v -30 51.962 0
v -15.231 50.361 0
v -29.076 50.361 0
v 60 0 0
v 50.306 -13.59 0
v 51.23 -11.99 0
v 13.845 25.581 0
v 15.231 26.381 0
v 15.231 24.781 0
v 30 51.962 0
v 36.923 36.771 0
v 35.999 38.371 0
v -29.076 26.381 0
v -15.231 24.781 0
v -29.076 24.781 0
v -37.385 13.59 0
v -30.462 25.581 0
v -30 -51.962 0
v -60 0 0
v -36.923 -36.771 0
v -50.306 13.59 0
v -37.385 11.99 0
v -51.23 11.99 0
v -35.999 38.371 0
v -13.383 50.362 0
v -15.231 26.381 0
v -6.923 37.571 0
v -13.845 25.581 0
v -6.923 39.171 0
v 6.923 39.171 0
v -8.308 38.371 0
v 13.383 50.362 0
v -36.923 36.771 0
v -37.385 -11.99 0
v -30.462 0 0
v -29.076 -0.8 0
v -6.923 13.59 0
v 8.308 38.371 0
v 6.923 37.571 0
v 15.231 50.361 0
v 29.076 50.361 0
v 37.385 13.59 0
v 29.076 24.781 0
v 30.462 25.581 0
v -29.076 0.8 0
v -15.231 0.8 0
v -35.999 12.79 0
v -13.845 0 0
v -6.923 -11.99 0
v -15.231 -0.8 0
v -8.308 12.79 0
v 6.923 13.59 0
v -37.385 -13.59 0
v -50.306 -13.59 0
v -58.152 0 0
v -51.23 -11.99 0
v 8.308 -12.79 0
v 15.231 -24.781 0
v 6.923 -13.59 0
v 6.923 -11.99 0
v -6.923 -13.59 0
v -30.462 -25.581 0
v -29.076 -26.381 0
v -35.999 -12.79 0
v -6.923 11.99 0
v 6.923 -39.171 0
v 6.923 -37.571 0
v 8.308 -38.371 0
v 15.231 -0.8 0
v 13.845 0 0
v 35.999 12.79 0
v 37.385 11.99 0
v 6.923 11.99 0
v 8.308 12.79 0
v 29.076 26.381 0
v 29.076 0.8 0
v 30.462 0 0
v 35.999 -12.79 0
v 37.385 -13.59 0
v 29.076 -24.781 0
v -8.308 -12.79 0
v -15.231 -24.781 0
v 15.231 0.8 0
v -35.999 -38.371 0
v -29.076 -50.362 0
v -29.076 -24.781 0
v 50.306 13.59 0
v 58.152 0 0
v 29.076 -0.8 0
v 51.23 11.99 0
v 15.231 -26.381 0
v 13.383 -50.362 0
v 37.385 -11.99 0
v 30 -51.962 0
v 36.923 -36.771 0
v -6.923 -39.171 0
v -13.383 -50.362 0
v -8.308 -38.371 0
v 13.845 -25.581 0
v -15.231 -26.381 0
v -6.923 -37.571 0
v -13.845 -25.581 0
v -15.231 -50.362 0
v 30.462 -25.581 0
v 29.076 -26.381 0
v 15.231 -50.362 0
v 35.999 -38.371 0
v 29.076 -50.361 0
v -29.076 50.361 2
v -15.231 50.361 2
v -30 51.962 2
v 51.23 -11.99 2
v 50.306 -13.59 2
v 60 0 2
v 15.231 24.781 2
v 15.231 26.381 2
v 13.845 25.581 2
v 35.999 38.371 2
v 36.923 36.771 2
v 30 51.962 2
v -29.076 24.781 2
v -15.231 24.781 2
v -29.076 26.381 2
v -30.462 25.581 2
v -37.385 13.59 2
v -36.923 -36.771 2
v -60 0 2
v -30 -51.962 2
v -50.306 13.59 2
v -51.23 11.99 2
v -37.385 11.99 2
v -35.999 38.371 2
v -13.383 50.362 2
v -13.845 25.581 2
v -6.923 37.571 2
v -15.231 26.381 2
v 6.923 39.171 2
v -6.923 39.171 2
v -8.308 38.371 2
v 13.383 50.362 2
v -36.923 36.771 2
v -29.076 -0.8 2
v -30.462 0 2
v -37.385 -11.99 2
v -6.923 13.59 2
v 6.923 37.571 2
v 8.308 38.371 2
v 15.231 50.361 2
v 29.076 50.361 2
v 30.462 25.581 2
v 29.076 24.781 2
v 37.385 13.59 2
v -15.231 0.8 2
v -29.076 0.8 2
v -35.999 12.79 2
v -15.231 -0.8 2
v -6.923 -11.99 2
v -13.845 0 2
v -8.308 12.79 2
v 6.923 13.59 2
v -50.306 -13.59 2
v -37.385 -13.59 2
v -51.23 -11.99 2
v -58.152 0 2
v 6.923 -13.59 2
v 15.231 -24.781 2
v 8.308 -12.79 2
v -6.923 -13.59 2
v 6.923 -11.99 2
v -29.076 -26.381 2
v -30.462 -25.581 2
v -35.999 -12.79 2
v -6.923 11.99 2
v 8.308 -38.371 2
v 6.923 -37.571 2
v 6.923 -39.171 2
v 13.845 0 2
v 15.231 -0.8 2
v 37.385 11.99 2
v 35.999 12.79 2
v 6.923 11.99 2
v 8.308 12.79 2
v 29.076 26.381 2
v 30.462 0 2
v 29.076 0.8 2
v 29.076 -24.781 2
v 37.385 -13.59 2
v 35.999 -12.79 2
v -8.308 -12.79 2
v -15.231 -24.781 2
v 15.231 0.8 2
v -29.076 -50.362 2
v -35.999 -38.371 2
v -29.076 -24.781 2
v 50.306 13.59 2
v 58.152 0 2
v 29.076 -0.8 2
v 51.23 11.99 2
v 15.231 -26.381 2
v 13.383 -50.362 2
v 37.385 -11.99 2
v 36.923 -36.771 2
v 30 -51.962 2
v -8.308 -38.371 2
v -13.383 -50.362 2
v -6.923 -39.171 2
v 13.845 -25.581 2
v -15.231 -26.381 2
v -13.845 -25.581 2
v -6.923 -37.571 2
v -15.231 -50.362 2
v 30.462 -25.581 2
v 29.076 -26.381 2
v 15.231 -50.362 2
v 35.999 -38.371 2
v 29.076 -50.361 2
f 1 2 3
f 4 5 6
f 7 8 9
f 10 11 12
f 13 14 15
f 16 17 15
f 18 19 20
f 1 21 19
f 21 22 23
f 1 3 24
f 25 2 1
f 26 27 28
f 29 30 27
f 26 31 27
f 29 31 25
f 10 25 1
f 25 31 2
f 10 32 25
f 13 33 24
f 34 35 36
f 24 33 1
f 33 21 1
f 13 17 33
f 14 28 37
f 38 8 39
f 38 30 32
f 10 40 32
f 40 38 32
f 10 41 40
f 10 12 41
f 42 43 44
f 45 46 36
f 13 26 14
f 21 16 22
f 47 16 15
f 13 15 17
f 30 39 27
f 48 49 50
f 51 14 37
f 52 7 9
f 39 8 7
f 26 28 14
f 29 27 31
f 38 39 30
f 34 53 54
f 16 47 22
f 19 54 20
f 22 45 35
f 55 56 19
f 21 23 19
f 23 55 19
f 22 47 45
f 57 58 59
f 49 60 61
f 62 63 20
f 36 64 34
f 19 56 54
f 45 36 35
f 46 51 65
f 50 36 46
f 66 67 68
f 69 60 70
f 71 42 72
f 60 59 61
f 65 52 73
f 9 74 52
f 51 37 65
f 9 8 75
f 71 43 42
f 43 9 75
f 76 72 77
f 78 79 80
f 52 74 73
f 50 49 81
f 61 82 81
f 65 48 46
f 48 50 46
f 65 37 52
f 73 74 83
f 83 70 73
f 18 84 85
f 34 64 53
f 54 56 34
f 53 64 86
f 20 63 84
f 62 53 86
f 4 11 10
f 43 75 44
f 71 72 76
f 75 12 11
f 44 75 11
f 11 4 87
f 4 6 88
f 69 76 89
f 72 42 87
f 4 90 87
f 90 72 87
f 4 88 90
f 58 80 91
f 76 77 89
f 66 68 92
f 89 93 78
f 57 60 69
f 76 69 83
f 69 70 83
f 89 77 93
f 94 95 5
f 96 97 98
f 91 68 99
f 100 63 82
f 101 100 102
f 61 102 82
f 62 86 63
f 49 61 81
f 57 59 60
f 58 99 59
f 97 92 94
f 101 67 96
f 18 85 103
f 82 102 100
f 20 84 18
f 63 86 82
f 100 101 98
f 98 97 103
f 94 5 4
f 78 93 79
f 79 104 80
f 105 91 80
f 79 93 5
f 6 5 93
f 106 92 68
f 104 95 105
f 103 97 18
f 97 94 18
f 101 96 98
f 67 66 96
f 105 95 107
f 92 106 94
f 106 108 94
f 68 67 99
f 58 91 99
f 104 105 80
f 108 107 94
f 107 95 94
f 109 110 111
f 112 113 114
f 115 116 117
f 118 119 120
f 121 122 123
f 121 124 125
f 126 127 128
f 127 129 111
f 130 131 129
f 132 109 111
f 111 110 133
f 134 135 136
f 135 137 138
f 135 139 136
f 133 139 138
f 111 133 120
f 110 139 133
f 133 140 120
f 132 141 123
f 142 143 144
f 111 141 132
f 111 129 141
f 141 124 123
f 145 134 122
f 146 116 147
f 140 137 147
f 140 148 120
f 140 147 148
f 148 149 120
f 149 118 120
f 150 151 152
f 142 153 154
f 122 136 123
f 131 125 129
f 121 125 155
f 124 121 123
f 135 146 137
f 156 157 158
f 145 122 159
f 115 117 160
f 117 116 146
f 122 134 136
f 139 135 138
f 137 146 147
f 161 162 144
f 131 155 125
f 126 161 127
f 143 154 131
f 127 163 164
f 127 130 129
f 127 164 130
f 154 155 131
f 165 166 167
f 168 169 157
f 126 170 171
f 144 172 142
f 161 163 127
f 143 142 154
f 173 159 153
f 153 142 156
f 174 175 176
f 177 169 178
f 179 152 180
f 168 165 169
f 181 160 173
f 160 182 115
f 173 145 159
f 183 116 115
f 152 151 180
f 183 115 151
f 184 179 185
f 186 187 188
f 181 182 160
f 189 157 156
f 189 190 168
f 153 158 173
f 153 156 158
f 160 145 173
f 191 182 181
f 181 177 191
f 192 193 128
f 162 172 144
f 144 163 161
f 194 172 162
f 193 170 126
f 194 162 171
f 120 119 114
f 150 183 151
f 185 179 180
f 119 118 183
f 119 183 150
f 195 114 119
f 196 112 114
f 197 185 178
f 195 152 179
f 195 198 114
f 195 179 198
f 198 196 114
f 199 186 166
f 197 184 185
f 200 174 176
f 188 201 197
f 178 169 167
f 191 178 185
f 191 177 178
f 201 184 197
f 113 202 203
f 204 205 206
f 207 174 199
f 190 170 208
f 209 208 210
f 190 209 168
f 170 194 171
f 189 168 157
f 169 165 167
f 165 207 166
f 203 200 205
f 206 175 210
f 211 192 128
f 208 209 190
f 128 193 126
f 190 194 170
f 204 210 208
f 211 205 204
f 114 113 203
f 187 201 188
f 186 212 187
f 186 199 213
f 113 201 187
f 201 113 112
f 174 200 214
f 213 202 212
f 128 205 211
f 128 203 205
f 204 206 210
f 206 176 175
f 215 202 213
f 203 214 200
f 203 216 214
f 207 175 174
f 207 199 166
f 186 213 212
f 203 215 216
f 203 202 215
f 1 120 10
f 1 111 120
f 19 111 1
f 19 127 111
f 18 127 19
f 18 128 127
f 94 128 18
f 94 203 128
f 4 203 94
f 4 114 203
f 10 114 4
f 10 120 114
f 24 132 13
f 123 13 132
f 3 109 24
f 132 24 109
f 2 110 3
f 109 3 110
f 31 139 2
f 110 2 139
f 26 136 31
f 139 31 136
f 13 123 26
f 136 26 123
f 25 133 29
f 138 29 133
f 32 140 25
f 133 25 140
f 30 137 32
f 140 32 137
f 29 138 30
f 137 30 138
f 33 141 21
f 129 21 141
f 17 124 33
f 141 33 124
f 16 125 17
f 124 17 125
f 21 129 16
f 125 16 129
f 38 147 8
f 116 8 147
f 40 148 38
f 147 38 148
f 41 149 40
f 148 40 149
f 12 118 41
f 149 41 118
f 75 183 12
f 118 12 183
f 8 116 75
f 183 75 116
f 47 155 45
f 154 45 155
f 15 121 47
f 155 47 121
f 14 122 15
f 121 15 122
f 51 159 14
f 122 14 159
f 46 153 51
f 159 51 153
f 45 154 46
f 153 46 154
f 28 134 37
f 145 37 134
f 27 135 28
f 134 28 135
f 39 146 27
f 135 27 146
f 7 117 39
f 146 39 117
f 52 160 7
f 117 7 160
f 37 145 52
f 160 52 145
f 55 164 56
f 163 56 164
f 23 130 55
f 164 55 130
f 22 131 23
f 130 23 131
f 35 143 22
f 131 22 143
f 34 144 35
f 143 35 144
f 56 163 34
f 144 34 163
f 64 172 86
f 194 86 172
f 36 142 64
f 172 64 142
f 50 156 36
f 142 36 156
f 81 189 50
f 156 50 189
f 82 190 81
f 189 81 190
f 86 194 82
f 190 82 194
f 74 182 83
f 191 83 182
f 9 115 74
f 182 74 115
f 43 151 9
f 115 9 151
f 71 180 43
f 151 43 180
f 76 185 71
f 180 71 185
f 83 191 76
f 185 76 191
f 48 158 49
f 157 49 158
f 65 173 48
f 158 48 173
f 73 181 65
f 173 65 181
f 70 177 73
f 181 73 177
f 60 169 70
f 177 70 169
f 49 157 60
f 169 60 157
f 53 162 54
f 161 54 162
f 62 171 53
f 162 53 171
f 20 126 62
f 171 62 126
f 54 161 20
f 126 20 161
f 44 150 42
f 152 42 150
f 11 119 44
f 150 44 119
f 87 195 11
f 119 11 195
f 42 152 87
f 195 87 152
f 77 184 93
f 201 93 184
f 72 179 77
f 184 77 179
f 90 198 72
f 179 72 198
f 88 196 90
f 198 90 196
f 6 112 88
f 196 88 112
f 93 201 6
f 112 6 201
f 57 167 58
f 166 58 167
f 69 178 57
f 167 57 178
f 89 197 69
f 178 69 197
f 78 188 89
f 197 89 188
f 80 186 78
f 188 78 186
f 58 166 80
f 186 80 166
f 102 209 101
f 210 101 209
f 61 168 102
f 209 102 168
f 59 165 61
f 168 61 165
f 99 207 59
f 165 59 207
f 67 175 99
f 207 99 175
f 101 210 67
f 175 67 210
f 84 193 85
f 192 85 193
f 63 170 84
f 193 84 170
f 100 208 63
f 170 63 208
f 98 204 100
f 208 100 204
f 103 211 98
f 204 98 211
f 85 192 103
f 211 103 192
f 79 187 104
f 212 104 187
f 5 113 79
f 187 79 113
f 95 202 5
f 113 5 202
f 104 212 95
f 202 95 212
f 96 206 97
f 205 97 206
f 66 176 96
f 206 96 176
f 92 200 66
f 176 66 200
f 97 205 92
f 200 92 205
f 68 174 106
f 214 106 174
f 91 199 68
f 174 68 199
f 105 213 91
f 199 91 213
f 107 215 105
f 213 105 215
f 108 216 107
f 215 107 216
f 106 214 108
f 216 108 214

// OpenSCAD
/* 
teselación hexagonal
gridHex1
100hex https://tecnoloxia.org/100hex/
CC By-SA
*/

/* visualización
------------------------
*/

hexagono(forma);
// tesela(forma);
// grid(forma);         // (F6)


/* Parámetros:
------------------------
*/

w = 1.6;              // separación (ancho liñas)
h = 2 ;                // altura
hex = 60 ;             // lado do hexágono
bordo = w ;           // ancho do bordo do hexágono

n = 4 ;                // teselas (formas 5, 6, 8, 9, 11, 12, 13 --> n par)

forma = 0 ;
//  0:hexágonos, 1:cubos, 2:triángulos, 3:cadrados random, 4:triángulos random,
//5:asahona, 6:soles, 7:pétalos, 8:FlowerOfLife1, 9:FlowerOfLife2, 
//10:círculos superpostos, 11:flores, 12: malla, 13: pajarita nazarí, 14: trapecios,
//15: estrelas-cubos, 16: Francois stone mosaic, 17: entrelazado, 18:FlowerOfLife3,
//19:flores2, 20:rectángulos superpostos, 21: círculos1, 22: círculos2, 
//23: círculos3, 24: estrelas e hexágonos 1, 25: estrelas e hexágonos 2, 
//26: estrelas e hexágonos 3, 27: estrelas e hexágonos 4, 
//28: círculos e triángulos, 29: estrelas e cadrados, 30: cubos2, 
//31: ondas1, 32: ondas2, 33: aspas

res = 60;       // resolución dos círculos

echo ("forma=", forma);
echo ("n=", n);

/* 
------------------------ 
*/

//  para centrar as seguintes formas n debe ser par
f= (forma==5||forma==6||forma==8||forma==9||forma==11||forma==12||forma==13||forma==14||forma==15||forma==16||forma==17||forma==18||forma==19||forma==20||forma==21||forma==22||forma==23 ||forma==24||forma==25||forma==26||forma==27||forma==29||forma==30   ) ? 1 : 0;
nt= f==1 && n%2==1 ? n+1 : n;       

// diámetro tesela (altura hexágono)
d =                             
n==0 ? 0: 
f==1 ? (2*hex-w/cos(30))/nt :
(2*hex*cos(30)-w)/nt; 

echo ("distancia d=", d);

// outras dimensións

d1=d/cos(30);
r=d/2;
r1=r/cos(30);
r2=(r+w/2)/cos(30);
r3=(r-w/2)/cos(30);

// xeración da tesela

module tesela(forma){
    
    // hexágonos
    
    if (forma==0) {
        difference(){
            circle (r=r3, $fn=6);
        }
    }
    
    // cubos
    
    if (forma==1) {
        difference() {
            circle (r=r3, $fn=6);
            for(i=[0:120:360]) rotate(i+30) translate([0,r,0]) square([w,d], center=true);
        }
    }
    
    // triángulos
    
    if (forma==2) {
        difference() {
            circle (r=r3, $fn=6);
            for(i=[0:60:360]) rotate(i+30) translate([0,r,0]) square([w,d], center=true);
        }
    }
    
     // cadrados random
    
    if (forma==3){
        xiro=(round(rands(-0,12,1)[0]));
        echo (xiro*15);
        rotate(xiro*15) circle (r=r-w/2, $fn=3);
    } 

     // triángulos random
    
    if (forma==4){
        xiro=(round(rands(-0,12,1)[0]));
        echo (xiro*15);
        rotate(xiro*15) circle (r=r-w/2, $fn=4);
    } 
    
    // asahona    
    
    if (forma==5){  
        difference(){
            circle (r=r1+0.01, $fn=6);
            for(i=[0:30:360]) rotate(i+30) square([w,d1], center=true);
        }
    }
    
    // soles   
    
    if (forma==6){
        difference(){
            circle (r=r1+0.01, $fn=6);
            rotate(120) 
                for(i=[0:15:360]) rotate(i+30) translate([0,r,0]) square([w,2*(d+w)], center=true);
        }
    } 
    
    // pétalos
    
    if (forma==7){
            rotate(15) for(i=[0:60:360]) rotate(i+32) intersection() {
                translate([-d/7,d/3,0]) circle (r=d/4,  $fn=res);
                translate([d/7,d/3,0]) circle (r=d/4, $fn=res);
            }
    }
    
   // flower of life 1
    
    if (forma==8){
        difference(){
            circle (r=r2, $fn=6);
                for ( i = [0 : 60 : 360] ){
                translate([d*sin(i),d*cos(i),0]) difference() {
                    circle(r=d+w/2, $fn=res);
                    circle(r=d-w/2, $fn=res);
                }    
            }
        }
    }
    
   // flower of life 2
    
    if (forma==9){
        difference(){
            circle (r=r2, $fn=6);
            for(i=[0:60:360]){
                rotate(i) intersection() {
                    translate([d*sin(0),d*cos(0),0]) circle(r=d+w/6, $fn=res); 
                    translate([d*sin(60),d*cos(60),0]) circle(r=d+w/6, $fn=res);
                    translate([d*sin(120),d*cos(120),0]) circle(r=d+w/6, $fn=res);
                }
            }
        } 
    }
    
   //círculos superpostos
    
   if (forma==10){
        difference(){
            circle (r=(r1)/cos(30), $fn=6);
            intersection() {
                circle (r=(r1)/cos(30)+0.01, $fn=6);
                for(i=[0:60:360]){
                    rotate(i) translate([0,d,0]) circle(r=r2-0.3, $fn=res); 
                }
            } 
        }
    }
    
   //flores
    
    if (forma==11){
        rotate(30) for(i=[0:60:360]){
            rotate(i) intersection() {
                translate([r2*sin(0),r2*cos(0),0]) circle(r=r1, $fn=res); 
                translate([r2*sin(60),r2*cos(60),0]) circle(r=r1, $fn=res);
                translate([r2*sin(120),r2*cos(120),0]) circle(r=r1, $fn=res);
            }
        }
    }
    
    // malla   
    
    if (forma==12){  
        difference(){
            circle (r=r3, $fn=6);
            for(i=[0:30:360]) rotate(i+30) square([w,d1], center=true);
        }
    }
   
    // pajarita nazari da Alhambra
    
    if (forma==13){
        rotate(30-atan(w/r3))  difference() {
            union() {
                circle(r3/2, $fn=res);
                for (i=[0:2]) rotate(i*120) translate([0,r3/2]) circle(r3/2, $fn=res);
            }
            for (i=[0:2]) rotate(i*120) translate([(d-w)/2,0]) circle(r3/2, $fn=res);
        }
    }
    
    // trapecios
    
    if (forma==14){
        difference() {
            circle (r=r3, $fn=6);
            // for(i=[0:90:360]) rotate(i+30) translate([0,r,0]) square([w,d], center=true);
            for(i=[0:60:360]) rotate(i) translate([0,d1/4*cos(30),0]) square([r1*(1-sin(30))+w/2,w], center=true);
            for(i=[0:60:360]) rotate(i+30) translate([0,r1,0]) square([w,d1*(1-sin(30))+w/2], center=true);
            for(i=[0:60:360]) rotate(i+60) translate([0,r,0]) square([w,r-w], center=true);
        }
    }
    
     // estrelas e cubos
    
    if (forma==15){
        difference() {
            circle (r=r3, $fn=6);
            //for(i=[0:60:360]) rotate(i+30) translate([0,r,0]) square([w,d], center=true);
            for(j=[0:60:360]) rotate(j) 
                translate([d1/4*cos(60),d1/4*sin(60),0]) for(i=[0:120:120]) rotate(i-90) translate([0,r,0]) square([w,d+w/2], center=true);
        }
    }   
    
    // Francois stone mosaic   

    if (forma==16){
        difference() {
            rotate(30) circle (r=r1/cos(30)-w/2/cos(30), $fn=6);
            for(i=[0:120:360]) rotate(i) translate([0,r,0]) square([w,d], center=true);
            for(i=[0:120:360]) rotate(i+60) translate([0,3/2*r1/cos(30)-w/cos(30),0]) rotate(30) circle(r=r1/cos(30)-w/2/cos(30), $fn=6);
         }
    }
    
    // Entrelazado

    if (forma==17){
        difference() {
            rotate(30) circle (r=r1/cos(30), $fn=6);
            for(i=[0:120:360]) rotate(i) translate([0,r,0]) square([w,d], center=true);
            for(i=[0:120:360]) rotate(i+60) translate([0,3/2*r1/cos(30)-3/2*w/cos(30),0]) rotate(30) circle(r=r1/cos(30)-w/2/cos(30), $fn=6);
         }
    }
    
    // flower of life 3
    
    if (forma==18) {
            for(i=[0:60:360]){
                rotate(i) intersection() {
                    translate([d*sin(0),d*cos(0),0]) circle(r=d-w/2, $fn=res); 
                    translate([d*sin(60),d*cos(60),0]) circle(r=d-w/2, $fn=res);
                    translate([d*sin(120),d*cos(120),0]) circle(r=d-w/2, $fn=res);
                }
            }
    }

   //flores2
    
    if (forma==19){
        difference(){
            circle (r=r1+0.01, $fn=6);
            rotate(30) for(i=[0:60:360]){
                rotate(i) intersection() {
                    translate([r1*sin(0),r1*cos(0),0]) circle(r=r2, $fn=res); 
                    translate([r1*sin(60),r1*cos(60),0]) circle(r=r2, $fn=res);
                    translate([r1*sin(120),r1*cos(120),0]) circle(r=r2, $fn=res);
                }
            }
        }
    }

     // rectángulos superpostos
    
    if (forma==20){
        difference() {
            circle (r=r1+0.01, $fn=6);
            for(i=[0:60:360]) rotate(i) translate([0,r,0]) difference() { 
                square([r1+w,r1*cos(30)+w], center=true);
                square([r1-w,r1*cos(30)-w], center=true);
            }
        }       
    }
    
    // círculos1
    
    if (forma==21){      
        difference() {
            circle (r=r1+0.01, $fn=6);
            for(i=[0:60:360]) rotate(i+30) translate([0,r1,0]) 
                circle(r=r1/2+0.2, $fn=res);
        }       
    }
    
    // círculos2
    
    if (forma==22){     
        difference() {
            circle (r=r1+0.01, $fn=6);
            for(i=[0:60:360]) rotate(i+30) translate([0,r1,0]) 
                difference() { 
                    circle(r=r1/2+w/2, $fn=res);
                    circle(r=r1/2-w/2, $fn=res);                
                }
        }       
    }
    
    // círculos3
    
    if (forma==23){     
        for(i=[0:60:360]) rotate(i+30) translate([0,r1,0]) 
            circle(r=r1/2-w/2, $fn=res);    
    }
    
   //estrelas e hexágonos 1
    
   if (forma==24){      
        difference() {
            circle (r=r1+0.01, $fn=6);
            for(i=[0:60:360]) rotate(i+30) 
                translate([2*r1-r1*cos(30)/2,0,0]) 
                difference() { 
                    circle(r=r1+w/2/cos(30),  $fn=6);
                    circle(r=r1-w/2/cos(30), $fn=6);                
                }
        }  
    }
    
    //estrelas e hexágonos 2
    
    if (forma==25){    
        difference() {
            circle (r=r1+0.01, $fn=6);
            for(i=[0:60:360]) rotate(i+30) 
                translate([2*r1-r1*cos(30)/2,0,0]) 
                    circle(r=r1+w/2/cos(30),  $fn=6);          
        }  
    } 
        
    // estrelas e hexágonos 3
    
   if (forma==26){       
        difference() {
            circle (r=r1+0.01, $fn=6);
            for(i=[0:60:360]) rotate(i+0) 
                translate([r1*(2-cos(60)),0,0]) 
                difference() { 
                    circle(r=r1+w/2/cos(30), $fn=6);
                    circle(r=r1-w/2/cos(30), $fn=6);                
                }
        }  
   }
 
     // estrelas e hexágonos 4   
    
    if (forma==27){    
        difference() {
            circle (r=r1+0.01, $fn=6);
            for(i=[0:60:360]) rotate(i+0) 
                translate([r1*(2-cos(60)),0,0]) 
                    circle(r=r1+w/2/cos(30), $fn=6);            
        }  
    }
    
    // círculos e triángulos
    
    if (forma==28) {
        difference() {
            circle (r=r3, $fn=6);
            for(i=[0:60:360]) rotate(i+30) translate([0,r,0]) square([w,d], center=true);
            for(i=[0:60:360]) rotate(i) translate([0,(r3+w/2)/2/cos(30),0]) 
                difference(){
                    circle (r=r3/2*tan(30)+w/2, $fn=res);
                    circle (r=r3/2*tan(30)-w/2, $fn=res);
                }
        }
    }
    
    // estrelas e cadrados
    
    if (forma==29){  
      rc=((r1-w*(1+tan(30)))*cos(45)/cos(15))/2;
      for(i=[0:60:360]) rotate(i) 
      translate([r1-rc-w/2/cos(30),0,0]) circle(r=rc, $fn=4);  
    }    
    
    // cubos2  

    if (forma==30){
        difference() {
            rotate(30) circle (r=r1/cos(30)-w/2/cos(30), $fn=6);
            for(i=[0:120:360]) rotate(i) translate([0,r,0]) square([w,d], center=true);
            for(i=[0:120:360]) rotate(i) translate([0,r1/cos(30)/2,0]) for(i=[0:120:360]) rotate(i) translate([0,r,0]) square([w,d], center=true);
            for(i=[0:120:360]) rotate(i+60) translate([0,3/2*r1/cos(30)-w/cos(30),0]) rotate(30) circle(r=r1/cos(30)-w/2/cos(30), $fn=6);
         }
    }
    
    // ondas 1
    if (forma==31){
        rotate(120) difference() {
            circle (r=r1+0.01, $fn=6); 
            for(i=[0:180:180]) rotate(i) difference(){
                translate([0,r,0]) circle (r=r+w/2, $fn=res); 
                translate([0,r,0]) circle (r=r-w/2, $fn=res);   
            }
        }     
    }
    
    // ondas 2
    
    if (forma==32){
        rotate(120) difference() {
            circle (r=r1+0.01, $fn=6); 
            for(i=[0:180:180]) rotate(i) difference(){
                translate([0,r,0]) circle (r=r+w/2, $fn=res); 
                translate([0,r,0]) circle (r=r-w/2, $fn=res);   
            }
            for(i=[0:180:180]) rotate(i) { 
                difference(){
                    translate([-r1/2,r,0]) circle (r=r1/2+w/2, $fn=res); 
                    translate([-r1/2,r,0]) circle (r=r1/2-w/2, $fn=res); 
                }
                difference(){
                    translate([r1/2,r,0]) circle (r=r1/2+w/2, $fn=res); 
                    translate([r1/2,r,0]) circle (r=r1/2-w/2, $fn=res); 
                }               
            }
        }
    }
    
    // aspas
    
    module semi() {
           difference(){
               translate([0,r/2,0]) circle (r=r/2+w/2, $fn=res); 
               translate([0,r/2,0]) circle (r=r/2-w/2, $fn=res); 
               translate([0,-r/2,0]) square([2*r,2*r], center=false); 
        }
    }
    
    if (forma==33){
        difference() {
            circle (r=r1+0.01, $fn=6);  
              for(i=[0:60:300]) rotate(i+120) semi();
              for(i=[0:60:300]) rotate(i) translate([0,r,0]) mirror([1,0,0])  semi();
        }     
    }
    
  
    

        
    
    
} // Fin teselas



// Xeración da teselación

module grid(forma){
    for (j=[0:1:nt*2]) 
        translate([(j%2)*r, j*r*2*cos(30), 0]) 
        for(i=[-nt:1:nt])
            translate([i*d,0,0]) rotate([0,0,30]) tesela(forma);
}


// Inserir a teselación dentro dun hexágono

// parámetros para centrar o hexágono
x= f==1 ? 0 : (-hex*cos(30)+w/2);
y= -nt*(r)*2*cos(30); 

rot= f==1 ? 0 : 30;

module hexagono(forma){
     rotate(rot) linear_extrude(h) union(){
         rotate(rot) difference (){
            circle(r=hex,  $fn=6);
            circle(r=hex-bordo/cos(30),  $fn=6);
        }
        difference(){
            rotate(rot) circle(r=hex,  $fn=6);
            translate([x,y,0]) grid(forma);
        }
    }
}
